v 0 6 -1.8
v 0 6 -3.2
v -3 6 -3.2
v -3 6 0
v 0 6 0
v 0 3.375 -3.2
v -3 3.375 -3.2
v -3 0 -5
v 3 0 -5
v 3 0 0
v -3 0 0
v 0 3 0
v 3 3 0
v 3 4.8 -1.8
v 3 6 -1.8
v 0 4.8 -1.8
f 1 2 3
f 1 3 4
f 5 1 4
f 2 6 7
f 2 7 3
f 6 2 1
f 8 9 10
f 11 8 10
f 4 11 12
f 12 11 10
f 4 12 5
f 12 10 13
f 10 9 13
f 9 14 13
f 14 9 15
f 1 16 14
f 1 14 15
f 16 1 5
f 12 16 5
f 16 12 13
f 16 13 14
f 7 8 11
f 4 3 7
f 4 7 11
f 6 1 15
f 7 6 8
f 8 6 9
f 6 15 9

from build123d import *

# Parameters (mm, degrees)
BOSS_EXTRUDE1_DEPTH = 3
SKETCH2_W           = 3.2
SKETCH2_H           = 6
BOSS_EXTRUDE2_DEPTH = 3
BOSS_EXTRUDE3_DEPTH = 3


with BuildPart() as part:
    # Sketch1 → Boss-Extrude1 (new body)
    with BuildSketch(Plane(origin=(0, 0, 0), x_dir=(0, 0, -1), z_dir=(1, 0, 0))):
        Polygon((0, 0), (0, 3), (1.8, 4.8), (1.8, 6), (5, 0), align=None)
    extrude(amount=BOSS_EXTRUDE1_DEPTH)

    # Sketch2 → Boss-Extrude2 (add)
    with BuildSketch(Plane.ZY):
        with Locations((-1.6, 3)):
            Rectangle(SKETCH2_W, SKETCH2_H)
    extrude(amount=BOSS_EXTRUDE2_DEPTH)

    # Sketch3 → Boss-Extrude3 (add)
    with BuildSketch(Plane.ZY):
        Polygon((-5, 0), (-3.2, 0), (-3.2, 3.375), align=None)
    extrude(amount=BOSS_EXTRUDE3_DEPTH)


solid = part.part
